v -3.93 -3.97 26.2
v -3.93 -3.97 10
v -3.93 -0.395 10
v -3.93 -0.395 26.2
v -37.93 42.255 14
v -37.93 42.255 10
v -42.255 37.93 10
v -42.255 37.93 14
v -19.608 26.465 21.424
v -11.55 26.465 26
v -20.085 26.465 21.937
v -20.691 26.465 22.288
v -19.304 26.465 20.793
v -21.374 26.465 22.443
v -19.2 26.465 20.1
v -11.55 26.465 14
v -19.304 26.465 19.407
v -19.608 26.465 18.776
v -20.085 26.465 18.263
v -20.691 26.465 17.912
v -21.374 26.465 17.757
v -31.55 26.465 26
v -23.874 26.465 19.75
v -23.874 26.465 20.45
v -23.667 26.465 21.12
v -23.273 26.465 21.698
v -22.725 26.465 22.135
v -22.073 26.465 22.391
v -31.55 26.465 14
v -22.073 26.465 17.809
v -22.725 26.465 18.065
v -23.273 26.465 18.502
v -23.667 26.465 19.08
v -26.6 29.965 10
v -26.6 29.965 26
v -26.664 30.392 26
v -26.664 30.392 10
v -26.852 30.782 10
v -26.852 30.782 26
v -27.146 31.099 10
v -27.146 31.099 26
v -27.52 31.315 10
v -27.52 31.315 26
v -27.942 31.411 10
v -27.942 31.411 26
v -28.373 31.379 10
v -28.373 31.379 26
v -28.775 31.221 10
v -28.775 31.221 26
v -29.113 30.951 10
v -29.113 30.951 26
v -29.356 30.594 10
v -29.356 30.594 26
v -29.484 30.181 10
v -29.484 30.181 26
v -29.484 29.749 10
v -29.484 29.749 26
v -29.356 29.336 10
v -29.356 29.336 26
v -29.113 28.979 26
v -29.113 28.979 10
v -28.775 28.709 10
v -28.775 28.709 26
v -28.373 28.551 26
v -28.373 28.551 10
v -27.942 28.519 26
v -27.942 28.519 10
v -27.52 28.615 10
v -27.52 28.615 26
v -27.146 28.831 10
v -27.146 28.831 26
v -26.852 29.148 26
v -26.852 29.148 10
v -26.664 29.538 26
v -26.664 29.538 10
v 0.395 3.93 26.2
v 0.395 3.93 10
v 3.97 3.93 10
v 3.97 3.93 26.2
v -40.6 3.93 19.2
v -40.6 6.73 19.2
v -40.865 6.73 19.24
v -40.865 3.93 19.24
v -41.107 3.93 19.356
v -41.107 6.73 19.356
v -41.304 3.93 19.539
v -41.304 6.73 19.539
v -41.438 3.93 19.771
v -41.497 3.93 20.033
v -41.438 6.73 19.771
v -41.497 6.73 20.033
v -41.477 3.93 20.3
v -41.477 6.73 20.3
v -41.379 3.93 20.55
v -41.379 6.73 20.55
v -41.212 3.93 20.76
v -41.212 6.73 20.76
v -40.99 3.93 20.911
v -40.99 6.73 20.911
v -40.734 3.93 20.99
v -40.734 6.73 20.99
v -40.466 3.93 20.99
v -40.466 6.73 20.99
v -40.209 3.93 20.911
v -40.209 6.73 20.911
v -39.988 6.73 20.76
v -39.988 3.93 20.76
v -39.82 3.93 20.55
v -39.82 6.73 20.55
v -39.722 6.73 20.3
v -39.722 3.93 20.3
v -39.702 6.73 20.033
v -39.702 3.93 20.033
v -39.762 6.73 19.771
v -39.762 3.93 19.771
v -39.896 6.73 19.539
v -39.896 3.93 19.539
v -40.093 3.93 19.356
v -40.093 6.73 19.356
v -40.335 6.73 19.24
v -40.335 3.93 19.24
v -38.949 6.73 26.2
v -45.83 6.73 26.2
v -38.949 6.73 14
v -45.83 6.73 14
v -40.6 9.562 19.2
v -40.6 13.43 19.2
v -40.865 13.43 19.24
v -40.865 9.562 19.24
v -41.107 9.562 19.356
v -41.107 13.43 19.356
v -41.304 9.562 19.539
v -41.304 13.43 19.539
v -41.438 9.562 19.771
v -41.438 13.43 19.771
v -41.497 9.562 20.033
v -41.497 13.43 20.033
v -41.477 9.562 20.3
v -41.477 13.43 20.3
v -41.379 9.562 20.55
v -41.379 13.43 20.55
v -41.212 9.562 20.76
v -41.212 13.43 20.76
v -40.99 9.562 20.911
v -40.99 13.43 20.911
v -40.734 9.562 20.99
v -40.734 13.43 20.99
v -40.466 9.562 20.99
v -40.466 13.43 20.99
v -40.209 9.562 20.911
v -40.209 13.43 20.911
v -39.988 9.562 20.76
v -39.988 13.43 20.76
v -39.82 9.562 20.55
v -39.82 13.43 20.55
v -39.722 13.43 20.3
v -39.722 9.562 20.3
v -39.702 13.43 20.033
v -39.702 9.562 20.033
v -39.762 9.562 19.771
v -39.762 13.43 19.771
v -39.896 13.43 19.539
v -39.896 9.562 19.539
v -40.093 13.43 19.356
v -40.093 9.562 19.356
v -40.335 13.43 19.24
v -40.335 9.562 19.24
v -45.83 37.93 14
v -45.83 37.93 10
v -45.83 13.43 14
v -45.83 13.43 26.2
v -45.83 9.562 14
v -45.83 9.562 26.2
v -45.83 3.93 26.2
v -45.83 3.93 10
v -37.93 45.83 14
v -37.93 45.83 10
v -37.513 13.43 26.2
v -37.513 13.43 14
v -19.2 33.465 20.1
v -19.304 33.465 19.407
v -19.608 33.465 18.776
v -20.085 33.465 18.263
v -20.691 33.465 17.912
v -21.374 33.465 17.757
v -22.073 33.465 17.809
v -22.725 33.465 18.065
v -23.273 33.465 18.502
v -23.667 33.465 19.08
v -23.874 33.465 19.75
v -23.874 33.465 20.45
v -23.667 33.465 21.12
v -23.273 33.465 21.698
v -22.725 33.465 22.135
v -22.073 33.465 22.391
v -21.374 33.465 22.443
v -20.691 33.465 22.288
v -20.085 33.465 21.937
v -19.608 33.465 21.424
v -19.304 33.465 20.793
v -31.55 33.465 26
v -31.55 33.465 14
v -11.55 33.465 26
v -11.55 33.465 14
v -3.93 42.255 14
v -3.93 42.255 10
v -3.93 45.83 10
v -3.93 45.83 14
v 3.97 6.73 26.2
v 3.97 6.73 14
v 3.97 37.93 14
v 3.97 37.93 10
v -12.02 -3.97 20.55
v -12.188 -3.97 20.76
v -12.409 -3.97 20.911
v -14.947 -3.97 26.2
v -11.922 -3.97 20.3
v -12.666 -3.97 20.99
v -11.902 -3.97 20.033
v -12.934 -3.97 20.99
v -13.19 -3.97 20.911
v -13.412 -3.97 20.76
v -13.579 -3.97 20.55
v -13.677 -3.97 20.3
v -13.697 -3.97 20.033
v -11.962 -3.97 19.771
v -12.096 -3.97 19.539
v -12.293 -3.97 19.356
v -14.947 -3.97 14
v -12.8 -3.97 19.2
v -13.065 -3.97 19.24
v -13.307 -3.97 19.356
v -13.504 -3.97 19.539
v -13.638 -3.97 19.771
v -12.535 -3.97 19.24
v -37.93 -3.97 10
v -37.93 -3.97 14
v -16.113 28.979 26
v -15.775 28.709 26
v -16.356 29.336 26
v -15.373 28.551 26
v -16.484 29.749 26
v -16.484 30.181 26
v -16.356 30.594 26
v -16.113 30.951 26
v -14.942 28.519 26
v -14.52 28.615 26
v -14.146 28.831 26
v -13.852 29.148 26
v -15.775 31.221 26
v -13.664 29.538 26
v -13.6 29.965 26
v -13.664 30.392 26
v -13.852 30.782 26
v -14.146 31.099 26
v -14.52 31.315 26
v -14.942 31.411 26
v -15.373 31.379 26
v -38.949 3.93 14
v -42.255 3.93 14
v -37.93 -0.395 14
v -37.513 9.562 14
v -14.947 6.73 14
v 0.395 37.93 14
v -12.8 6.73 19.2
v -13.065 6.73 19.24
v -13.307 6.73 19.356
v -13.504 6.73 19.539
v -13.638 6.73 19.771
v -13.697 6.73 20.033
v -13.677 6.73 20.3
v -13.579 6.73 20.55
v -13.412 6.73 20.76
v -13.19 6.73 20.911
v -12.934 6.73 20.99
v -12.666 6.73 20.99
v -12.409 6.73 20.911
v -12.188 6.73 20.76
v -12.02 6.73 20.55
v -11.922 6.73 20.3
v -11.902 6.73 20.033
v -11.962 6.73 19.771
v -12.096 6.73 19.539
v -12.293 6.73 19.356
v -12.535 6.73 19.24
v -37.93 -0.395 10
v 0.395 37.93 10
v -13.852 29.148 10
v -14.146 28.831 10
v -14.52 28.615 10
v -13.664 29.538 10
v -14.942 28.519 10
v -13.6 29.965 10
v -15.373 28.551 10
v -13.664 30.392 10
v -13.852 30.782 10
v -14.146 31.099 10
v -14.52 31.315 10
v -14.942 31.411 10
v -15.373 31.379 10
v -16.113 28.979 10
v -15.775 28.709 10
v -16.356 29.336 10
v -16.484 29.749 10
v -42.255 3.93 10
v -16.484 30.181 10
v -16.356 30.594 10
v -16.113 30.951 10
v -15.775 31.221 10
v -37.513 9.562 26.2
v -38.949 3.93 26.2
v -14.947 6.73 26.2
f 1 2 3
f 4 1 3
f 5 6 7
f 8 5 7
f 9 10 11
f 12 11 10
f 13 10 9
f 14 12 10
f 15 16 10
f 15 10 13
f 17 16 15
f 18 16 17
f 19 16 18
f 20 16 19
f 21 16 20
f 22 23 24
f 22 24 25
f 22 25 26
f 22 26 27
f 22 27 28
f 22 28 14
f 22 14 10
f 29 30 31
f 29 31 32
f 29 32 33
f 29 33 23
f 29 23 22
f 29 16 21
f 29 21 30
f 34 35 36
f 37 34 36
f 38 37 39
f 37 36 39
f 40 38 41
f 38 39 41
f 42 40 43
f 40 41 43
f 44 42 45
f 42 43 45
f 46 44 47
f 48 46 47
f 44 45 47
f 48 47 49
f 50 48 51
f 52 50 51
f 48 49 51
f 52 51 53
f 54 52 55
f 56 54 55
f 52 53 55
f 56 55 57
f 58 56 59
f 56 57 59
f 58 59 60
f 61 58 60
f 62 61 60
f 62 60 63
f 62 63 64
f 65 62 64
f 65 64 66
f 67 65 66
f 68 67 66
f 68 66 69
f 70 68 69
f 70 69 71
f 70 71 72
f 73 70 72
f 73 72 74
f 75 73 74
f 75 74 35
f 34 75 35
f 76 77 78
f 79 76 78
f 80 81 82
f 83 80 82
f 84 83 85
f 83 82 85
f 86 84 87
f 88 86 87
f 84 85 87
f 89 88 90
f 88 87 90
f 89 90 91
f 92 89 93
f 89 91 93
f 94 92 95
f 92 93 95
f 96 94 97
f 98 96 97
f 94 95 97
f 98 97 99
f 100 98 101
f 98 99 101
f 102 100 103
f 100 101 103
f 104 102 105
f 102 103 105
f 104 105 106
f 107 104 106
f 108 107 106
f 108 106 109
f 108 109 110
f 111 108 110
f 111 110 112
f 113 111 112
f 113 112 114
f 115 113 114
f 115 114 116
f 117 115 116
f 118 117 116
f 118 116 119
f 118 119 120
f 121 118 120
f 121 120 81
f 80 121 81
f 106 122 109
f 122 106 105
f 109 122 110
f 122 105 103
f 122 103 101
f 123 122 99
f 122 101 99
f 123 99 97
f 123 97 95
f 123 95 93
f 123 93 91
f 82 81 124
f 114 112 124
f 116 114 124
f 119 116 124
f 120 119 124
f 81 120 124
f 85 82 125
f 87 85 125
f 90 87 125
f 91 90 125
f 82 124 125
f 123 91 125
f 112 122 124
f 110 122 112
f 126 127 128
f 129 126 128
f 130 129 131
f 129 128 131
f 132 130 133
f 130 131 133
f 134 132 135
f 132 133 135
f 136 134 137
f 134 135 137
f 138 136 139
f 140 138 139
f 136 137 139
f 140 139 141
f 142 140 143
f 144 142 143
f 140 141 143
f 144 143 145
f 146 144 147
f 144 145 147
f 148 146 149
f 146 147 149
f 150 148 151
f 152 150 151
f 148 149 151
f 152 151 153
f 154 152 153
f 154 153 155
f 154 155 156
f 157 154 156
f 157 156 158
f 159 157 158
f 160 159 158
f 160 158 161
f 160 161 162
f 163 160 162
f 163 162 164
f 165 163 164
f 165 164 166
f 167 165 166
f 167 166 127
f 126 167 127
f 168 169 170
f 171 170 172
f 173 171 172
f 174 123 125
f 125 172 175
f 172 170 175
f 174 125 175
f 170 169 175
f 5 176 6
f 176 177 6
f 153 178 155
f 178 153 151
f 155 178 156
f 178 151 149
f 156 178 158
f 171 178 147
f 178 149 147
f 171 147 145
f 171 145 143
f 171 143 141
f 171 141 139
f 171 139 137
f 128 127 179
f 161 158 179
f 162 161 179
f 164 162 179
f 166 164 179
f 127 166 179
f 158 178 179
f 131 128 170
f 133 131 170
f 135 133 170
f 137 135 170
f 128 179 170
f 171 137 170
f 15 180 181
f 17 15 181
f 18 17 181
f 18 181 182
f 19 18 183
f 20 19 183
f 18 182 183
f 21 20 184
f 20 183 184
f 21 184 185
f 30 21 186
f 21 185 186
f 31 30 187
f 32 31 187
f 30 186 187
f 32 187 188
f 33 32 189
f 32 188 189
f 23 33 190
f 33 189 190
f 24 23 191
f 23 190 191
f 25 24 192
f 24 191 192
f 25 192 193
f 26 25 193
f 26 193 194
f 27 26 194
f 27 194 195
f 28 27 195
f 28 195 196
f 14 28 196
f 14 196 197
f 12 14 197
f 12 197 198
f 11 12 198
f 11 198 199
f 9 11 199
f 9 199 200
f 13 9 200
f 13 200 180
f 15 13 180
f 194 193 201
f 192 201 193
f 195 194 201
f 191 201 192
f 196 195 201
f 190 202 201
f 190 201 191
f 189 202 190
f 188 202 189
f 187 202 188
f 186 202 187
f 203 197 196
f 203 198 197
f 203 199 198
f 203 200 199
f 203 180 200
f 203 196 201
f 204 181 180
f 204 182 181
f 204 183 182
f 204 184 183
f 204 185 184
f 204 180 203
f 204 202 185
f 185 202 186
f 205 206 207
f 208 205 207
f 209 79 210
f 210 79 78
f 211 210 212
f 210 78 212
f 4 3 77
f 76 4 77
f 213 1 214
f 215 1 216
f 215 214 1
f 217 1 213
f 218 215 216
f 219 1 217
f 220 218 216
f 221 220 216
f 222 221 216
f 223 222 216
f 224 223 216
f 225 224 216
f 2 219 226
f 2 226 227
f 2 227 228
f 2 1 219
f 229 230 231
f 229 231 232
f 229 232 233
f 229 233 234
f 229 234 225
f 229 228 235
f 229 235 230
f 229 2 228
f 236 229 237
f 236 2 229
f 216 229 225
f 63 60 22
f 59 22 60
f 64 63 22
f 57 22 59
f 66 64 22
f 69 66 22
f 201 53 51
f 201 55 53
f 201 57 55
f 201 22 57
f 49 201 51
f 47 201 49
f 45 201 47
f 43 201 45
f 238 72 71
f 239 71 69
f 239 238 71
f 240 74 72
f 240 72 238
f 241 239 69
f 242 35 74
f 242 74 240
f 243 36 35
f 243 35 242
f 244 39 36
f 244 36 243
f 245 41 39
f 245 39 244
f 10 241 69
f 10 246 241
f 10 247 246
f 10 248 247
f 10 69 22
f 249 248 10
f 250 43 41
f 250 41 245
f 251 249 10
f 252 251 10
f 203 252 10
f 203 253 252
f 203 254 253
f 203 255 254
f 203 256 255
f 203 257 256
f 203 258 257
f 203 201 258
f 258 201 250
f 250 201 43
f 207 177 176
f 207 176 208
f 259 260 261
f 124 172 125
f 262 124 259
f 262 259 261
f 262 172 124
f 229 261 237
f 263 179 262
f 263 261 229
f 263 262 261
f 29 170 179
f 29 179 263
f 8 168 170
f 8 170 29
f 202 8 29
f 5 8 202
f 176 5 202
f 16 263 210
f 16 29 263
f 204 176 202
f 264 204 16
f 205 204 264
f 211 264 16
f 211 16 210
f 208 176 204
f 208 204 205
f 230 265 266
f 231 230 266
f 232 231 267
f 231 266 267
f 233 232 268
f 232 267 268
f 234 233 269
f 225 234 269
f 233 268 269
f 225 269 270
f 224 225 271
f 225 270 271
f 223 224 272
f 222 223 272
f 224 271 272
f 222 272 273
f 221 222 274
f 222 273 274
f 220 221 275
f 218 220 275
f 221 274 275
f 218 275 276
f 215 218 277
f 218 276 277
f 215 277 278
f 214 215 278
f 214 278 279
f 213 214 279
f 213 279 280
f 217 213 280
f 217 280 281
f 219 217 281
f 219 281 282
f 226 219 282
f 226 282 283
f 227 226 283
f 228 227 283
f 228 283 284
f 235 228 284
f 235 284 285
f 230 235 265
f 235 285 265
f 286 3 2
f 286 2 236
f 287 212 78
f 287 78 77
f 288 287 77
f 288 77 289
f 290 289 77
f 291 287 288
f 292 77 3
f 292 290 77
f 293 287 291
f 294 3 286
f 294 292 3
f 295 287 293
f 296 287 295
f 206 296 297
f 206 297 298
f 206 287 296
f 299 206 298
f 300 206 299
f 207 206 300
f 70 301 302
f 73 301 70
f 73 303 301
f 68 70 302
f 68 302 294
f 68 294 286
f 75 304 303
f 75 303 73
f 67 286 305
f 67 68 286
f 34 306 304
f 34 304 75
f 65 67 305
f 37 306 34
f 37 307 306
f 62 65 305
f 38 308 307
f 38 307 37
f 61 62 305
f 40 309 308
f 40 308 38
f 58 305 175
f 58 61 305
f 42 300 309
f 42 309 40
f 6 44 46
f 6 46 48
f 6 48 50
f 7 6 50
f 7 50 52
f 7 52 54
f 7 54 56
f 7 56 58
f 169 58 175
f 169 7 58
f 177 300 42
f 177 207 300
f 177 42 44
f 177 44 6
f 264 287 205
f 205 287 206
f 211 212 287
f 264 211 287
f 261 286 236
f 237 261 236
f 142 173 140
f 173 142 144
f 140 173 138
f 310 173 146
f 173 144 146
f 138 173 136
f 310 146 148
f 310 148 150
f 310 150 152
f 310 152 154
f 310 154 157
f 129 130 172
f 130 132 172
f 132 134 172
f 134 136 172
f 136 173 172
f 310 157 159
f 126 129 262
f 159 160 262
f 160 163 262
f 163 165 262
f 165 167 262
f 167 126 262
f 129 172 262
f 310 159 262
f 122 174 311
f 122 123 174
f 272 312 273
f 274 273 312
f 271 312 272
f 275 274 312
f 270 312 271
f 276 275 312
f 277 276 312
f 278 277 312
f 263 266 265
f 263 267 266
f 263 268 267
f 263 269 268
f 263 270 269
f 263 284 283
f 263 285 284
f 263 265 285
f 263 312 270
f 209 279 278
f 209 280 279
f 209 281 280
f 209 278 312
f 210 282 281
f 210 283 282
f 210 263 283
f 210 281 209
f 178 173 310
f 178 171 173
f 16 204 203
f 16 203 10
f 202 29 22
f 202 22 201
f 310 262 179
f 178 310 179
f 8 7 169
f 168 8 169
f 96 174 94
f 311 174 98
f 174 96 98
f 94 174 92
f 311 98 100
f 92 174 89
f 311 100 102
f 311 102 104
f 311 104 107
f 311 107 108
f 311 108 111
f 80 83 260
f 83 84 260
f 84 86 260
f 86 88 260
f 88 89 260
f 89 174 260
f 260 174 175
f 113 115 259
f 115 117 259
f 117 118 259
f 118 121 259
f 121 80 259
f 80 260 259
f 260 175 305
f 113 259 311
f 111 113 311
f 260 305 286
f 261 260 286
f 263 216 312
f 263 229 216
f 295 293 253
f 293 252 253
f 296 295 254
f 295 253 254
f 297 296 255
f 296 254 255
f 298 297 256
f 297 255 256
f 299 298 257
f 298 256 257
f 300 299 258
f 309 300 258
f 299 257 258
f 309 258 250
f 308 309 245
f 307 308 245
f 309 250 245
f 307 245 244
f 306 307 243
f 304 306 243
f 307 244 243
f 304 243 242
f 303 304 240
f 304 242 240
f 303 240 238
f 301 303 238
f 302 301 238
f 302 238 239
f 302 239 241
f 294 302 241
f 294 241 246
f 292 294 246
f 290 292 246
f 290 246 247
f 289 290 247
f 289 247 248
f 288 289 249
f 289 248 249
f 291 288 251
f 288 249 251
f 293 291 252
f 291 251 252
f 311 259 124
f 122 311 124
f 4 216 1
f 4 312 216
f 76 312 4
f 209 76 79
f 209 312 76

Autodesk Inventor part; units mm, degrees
ref_plane "YZ Plane" through (0, 0, 0) normal (1, 0, 0) x (0, 1, 0)
ref_plane "Work Plane1" through (0, 0, 10) normal (0, 0, 1) x (1, 0, 0)
sketch "Sketch1" plane through (0, 0, 10) normal (0, 0, 1) x (1, 0, 0)
  line L0 (-4.0299, -0.3538) -> (-2.2322, 1.4439) construction
  arc A0 (-1.4439, 2.2322) -> (-2.2322, 1.4439) centre (-0.9299, 0.9299) ccw construction
  line L1 (-1.4439, 2.2322) -> (0.3538, 4.0299) construction
  line L2 (-37.8299, 42.2137) -> (-37.8299, 45.8299) construction
  line L3 (-37.8299, 45.8299) -> (-4.0299, 45.8299) construction
  line L4 (-4.0299, 45.8299) -> (-4.0299, 42.2137) construction
  line L5 (-4.0299, 4.0299) -> (0.3538, 4.0299) projected
  circle A1 centre (-20.9299, 20.9299) radius 17.5 construction
  line L6 (-20.9299, 58.9723) -> (17.1124, 20.9299) construction
  line L7 (17.1124, 20.9299) -> (-20.9299, -17.1124) construction
  line L8 (-20.9299, -17.1124) -> (-58.9723, 20.9299) construction
  line L9 (-58.9723, 20.9299) -> (-20.9299, 58.9723) construction
  line L10 (-20.9299, 58.9723) -> (-20.9299, -17.1124) construction
  line L11 (17.1124, 20.9299) -> (-58.9723, 20.9299) construction
  line L12 (-20.9299, 58.9723) -> (32.8701, 58.9723) construction
  line L13 (-43.2198, 43.4299) -> (1.7802, 43.4299) construction
  line L14 (1.7802, 43.4299) -> (1.7802, -1.5701) construction
  line L15 (1.7802, -1.5701) -> (-43.2198, -1.5701) construction
  line L16 (-43.2198, -1.5701) -> (-43.2198, 43.4299) construction
  line L17 (-43.2198, 5.1774) -> (-43.2198, 36.6824)
  line L18 (-43.2198, 36.6824) -> (-36.4723, 43.4299)
  line L19 (-36.4723, 43.4299) -> (-5.3876, 43.4299)
  line L20 (-5.3876, 43.4299) -> (1.7802, 36.2621)
  line L21 (1.7802, 36.2621) -> (1.7802, 5.5977)
  line L22 (1.7802, 5.5977) -> (-5.3876, -1.5701)
  line L23 (-5.3876, -1.5701) -> (-36.4723, -1.5701)
  line L24 (-36.4723, -1.5701) -> (-43.2198, 5.1774)
  line L25 (-4.0299, 42.2137) -> (-37.8299, 42.2137) projected
  line L26 (-4.0299, -0.3538) -> (-4.0299, 4.0299) projected
  circle A2 centre (-20.7198, 20.9299) radius 7.0417 construction
  arc A3 (-7.3745, 3.5) -> (-34.4854, 3.5) centre (-20.9299, 0) ccw construction
  arc A4 (-11.4668, 9.7661) -> (-30.4087, 10.1422) centre (-20.7198, 20.9299) ccw
  line L27 (-30.5806, 10.1422) -> (-30.4087, 10.1422)
  line L28 (-30.4087, 10.1422) -> (-30.4087, 1.6029)
  line L29 (-30.4087, 1.6029) -> (-11.4668, 1.6029)
  line L30 (-11.4668, 1.6029) -> (-11.4668, 9.7661)
  line L31 (-43.2198, 43.4299) -> (-10.4667, 10.6769) construction
  line L32 (-8.5595, 8.5517) -> (1.7802, -1.5701) construction
  line L33 (1.7802, 43.4299) -> (-25.699, 15.9507) construction
  line L34 (-30.9728, 10.6769) -> (-43.2198, -1.5701) construction
  point P0 (-37.8299, 4.0299)
  dimension "d18" = 53.8
  dimension "d19" = 45
  dimension "d20" = 53.8
  dimension "d21" = 45
  dimension "d22" = 45
  dimension "d68" = 29
extrude "Extrusion1" add sketch "Sketch1" along normal blind 4 contours L26 L22 L23 L24 L17 L18 L25 L20 L21 L5 | L5 L22 L26 | L25 L18 L19 L20 | L30 L29 L28 A4
sketch "Sketch3" plane through (0, 0, 10) normal (0, 0, -1) x (-1, 0, 0)
  line L0 (37.8299, -0.4701) -> (37.8299, 4.0299) construction
  line L1 (4.0299, 4.0299) -> (4.0299, -0.4701) construction
  line L2 (37.8299, -0.4701) -> (37.8299, 1.1886) construction
  line L3 (4.0299, -3.9701) -> (4.0299, -0.3538) construction
  line L4 (45.8299, 4.0299) -> (42.2137, 4.0299) construction
  line L5 (-0.3538, 4.0299) -> (-3.9701, 4.0299) construction
  line L6 (-3.9701, 37.8299) -> (-0.3538, 37.8299) construction
  line L7 (4.0299, 42.2137) -> (4.0299, 45.8299) construction
  line L8 (37.8299, 45.8299) -> (37.8299, 42.2137) construction
  line L9 (42.2137, 37.8299) -> (45.8299, 37.8299) construction
  line L10 (37.8299, 37.7299) -> (45.8299, 37.7299)
  line L11 (45.8299, 37.7299) -> (45.8299, 4.1299)
  line L12 (45.8299, 4.1299) -> (37.8299, 4.1299)
  line L13 (37.8299, 4.1299) -> (37.8299, 37.7299)
  line L14 (37.7299, 4.0299) -> (4.1299, 4.0299)
  line L15 (4.1299, 4.0299) -> (4.1299, -3.9701)
  line L16 (4.1299, -3.9701) -> (37.7299, -3.9701)
  line L17 (37.7299, -3.9701) -> (37.7299, 4.0299)
  line L18 (4.0299, 4.1299) -> (-3.9701, 4.1299)
  line L19 (-3.9701, 4.1299) -> (-3.9701, 37.7299)
  line L20 (-3.9701, 37.7299) -> (4.0299, 37.7299)
  line L21 (4.0299, 37.7299) -> (4.0299, 4.1299)
  line L22 (4.1299, 37.8299) -> (37.7299, 37.8299)
  line L23 (37.7299, 37.8299) -> (37.7299, 45.8299)
  line L24 (37.7299, 45.8299) -> (4.1299, 45.8299)
  line L25 (4.1299, 45.8299) -> (4.1299, 37.8299)
  point P0 (0, 0)
  dimension "d23" = 0.1
  dimension "d24" = 0.1
  dimension "d25" = 0.1
  dimension "d26" = 0.1
  dimension "d27" = 0.1
extrude "Extrusion3" add sketch "Sketch3" against normal up to surface (4 mm away)
sketch "Skizze12" plane through (0, 0, 10) normal (0, 0, -1) x (-1, 0, 0)
  line L0 (-0.3124, 4.1299) -> (4.1299, -0.3124) projected
  line L1 (4.1299, -0.3124) -> (4.1299, -3.9701) projected
  line L2 (4.1299, -3.9701) -> (37.7299, -3.9701) construction
  line L3 (37.7299, -3.9701) -> (37.7299, -0.3124) projected
  line L4 (37.7299, -0.3124) -> (42.1723, 4.1299) projected
  line L5 (45.8299, 4.1299) -> (42.1723, 4.1299) projected
  line L6 (45.8299, 37.7299) -> (45.8299, 4.1299) construction
  line L7 (42.1723, 37.7299) -> (45.8299, 37.7299) projected
  line L8 (42.1723, 37.7299) -> (37.7299, 42.1723) projected
  line L9 (37.7299, 42.1723) -> (37.7299, 45.8299) projected
  line L10 (37.7299, 45.8299) -> (4.1299, 45.8299) construction
  line L11 (4.1299, 45.8299) -> (4.1299, 42.1723) projected
  line L12 (4.1299, 42.1723) -> (-0.3124, 37.7299) projected
  line L13 (-3.9701, 37.7299) -> (-0.3124, 37.7299) projected
  line L14 (-3.9701, 4.1299) -> (-3.9701, 37.7299) construction
  line L15 (-0.3124, 4.1299) -> (-3.9701, 4.1299) projected
  line L16 (37.9299, -4.1701) -> (3.9299, -4.1701) construction
  line L17 (3.9299, -4.1701) -> (3.9299, -0.3953)
  line L18 (3.9299, -0.3953) -> (-0.3953, 3.9299)
  line L19 (-0.3953, 3.9299) -> (-4.1701, 3.9299)
  line L20 (-4.1701, 3.9299) -> (-4.1701, 37.9299) construction
  line L21 (-4.1701, 37.9299) -> (-0.3953, 37.9299)
  line L22 (-0.3953, 37.9299) -> (3.9299, 42.2551)
  line L23 (3.9299, 42.2551) -> (3.9299, 46.0299)
  line L24 (3.9299, 46.0299) -> (37.9299, 46.0299) construction
  line L25 (37.9299, 46.0299) -> (37.9299, 42.2551)
  line L26 (37.9299, 42.2551) -> (42.2551, 37.9299)
  line L27 (42.2551, 37.9299) -> (46.0299, 37.9299)
  line L28 (46.0299, 37.9299) -> (46.0299, 3.9299) construction
  line L29 (46.0299, 3.9299) -> (42.2551, 3.9299)
  line L30 (42.2551, 3.9299) -> (37.9299, -0.3953)
  line L31 (37.9299, -0.3953) -> (37.9299, -4.1701)
  line L32 (-3.9701, 37.7299) -> (-3.9701, 37.9299)
  line L33 (37.7299, 45.8299) -> (4.1299, 45.8299) projected
  line L34 (4.1299, 45.8299) -> (3.9299, 45.8299)
  line L35 (37.7299, 45.8299) -> (37.9299, 45.8299)
  line L36 (45.8299, 37.7299) -> (45.8299, 37.9299)
  line L37 (45.8299, 4.1299) -> (45.8299, 3.9299)
  line L38 (37.7299, -3.9701) -> (37.9299, -3.9701)
  line L39 (4.1299, -3.9701) -> (3.9299, -3.9701)
  line L40 (-3.9701, 4.1299) -> (-3.9701, 3.9299)
  point P0 (0, 0)
  dimension "d65" = 0.2
extrude "IM_offset" add sketch "Skizze12" against normal up to surface (4 mm away)
sketch "Sketch15" plane through (0, 0, 14) normal (0, 0, 1) x (1, 0, 0)
  line L0 (-16.2999, 13.4299) -> (-16.2999, 9.2299) projected
  line L1 (-16.2999, 13.4299) -> (-19.9879, 13.4299) projected
  line L2 (-21.5499, 13.4299) -> (-19.9879, 13.4299) projected
  line L3 (-23.112, 13.4299) -> (-21.5499, 13.4299) projected
  line L4 (-23.112, 13.4299) -> (-37.0999, 13.4299) projected
  line L5 (-37.0999, 13.4299) -> (-37.0999, 9.2299) projected
  line L6 (-41.8999, 9.2299) -> (-37.0999, 9.2299) projected
  line L7 (-41.8999, 9.2299) -> (-41.8999, 6.7299) projected
  line L8 (-41.8999, 6.7299) -> (-11.4999, 6.7299) projected
  line L9 (-11.4999, 9.2299) -> (-11.4999, 6.7299) projected
  line L10 (-16.2999, 9.2299) -> (-11.4999, 9.2299) projected
  line L11 (3.9701, 37.9299) -> (3.9701, 3.9299) projected
  line L12 (0.3953, 37.9299) -> (3.9701, 37.9299) projected
  line L13 (-3.9299, 42.2551) -> (0.3953, 37.9299) projected
  line L14 (-3.9299, 45.8299) -> (-3.9299, 42.2551) projected
  line L15 (-37.9299, 45.8299) -> (-3.9299, 45.8299) projected
  line L16 (-37.9299, 42.2551) -> (-37.9299, 45.8299) projected
  line L17 (-42.2551, 37.9299) -> (-37.9299, 42.2551) projected
  line L18 (-45.8299, 37.9299) -> (-42.2551, 37.9299) projected
  line L19 (-45.8299, 3.9299) -> (-45.8299, 37.9299) projected
  line L20 (-42.2551, 3.9299) -> (-45.8299, 3.9299) projected
  line L21 (-37.9299, -0.3953) -> (-42.2551, 3.9299) projected
  line L22 (-37.9299, -3.9701) -> (-37.9299, -0.3953) projected
  line L23 (-3.9299, -3.9701) -> (-37.9299, -3.9701) projected
  line L24 (-3.9299, -0.3953) -> (-3.9299, -3.9701) projected
  line L25 (0.3953, 3.9299) -> (-3.9299, -0.3953) projected
  line L26 (3.9701, 3.9299) -> (0.3953, 3.9299) projected
  line L27 (-45.8299, 3.9299) -> (-38.9491, 3.9299)
  line L28 (-38.9491, 3.9299) -> (-38.9491, 6.7299)
  line L29 (-38.9491, 6.7299) -> (-45.8299, 6.7299)
  line L30 (-45.8299, 6.7299) -> (-45.8299, 3.9299)
  line L31 (3.9701, 3.9299) -> (0.3953, 3.9299) projected
  line L32 (-14.947, 6.7299) -> (3.9701, 6.7299)
  line L33 (3.9701, 6.7299) -> (3.9701, 3.9299)
  line L34 (3.9701, 3.9299) -> (-14.947, 3.9299)
  line L35 (-14.947, 3.9299) -> (-14.947, 6.7299)
  line L36 (0.3953, 3.9299) -> (-3.9299, -0.3953)
  line L37 (-3.9299, -0.3953) -> (-3.9299, -3.9701)
  line L38 (-3.9299, -3.9701) -> (-37.9299, -3.9701) projected
  line L39 (-3.9299, -3.9701) -> (-14.947, -3.9701)
  line L40 (-14.947, 3.9299) -> (-14.947, -3.9701)
  line L41 (-45.8299, 3.9299) -> (-45.8299, 37.9299) projected
  line L42 (-45.8299, 9.5618) -> (-37.5128, 9.5618)
  line L43 (-37.5128, 9.5618) -> (-37.5128, 13.4299)
  line L44 (-37.5128, 13.4299) -> (-45.8299, 13.4299)
  line L45 (-45.8299, 13.4299) -> (-45.8299, 9.5618)
  point P0 (0, 0)
ref_plane "Work Plane4" through (-41.8999, 11.7299, 26.2) normal (0, 0, 1) x (1, 0, 0)
extrude "Extrusion13" add sketch "Sketch15" along normal up to surface (12.2 mm away) contours L32 L11 L26 L34 L35 L8 | L28 L27 L20 L19 L29 L8 | L34 L25 L24 L23 L40 | L19 L44 L43 L42
sketch "Sketch16" plane through (-45.8299, -3.9701, 10) normal (0, -1, 0) x (1, 0, 0)
  circle A0 centre (5.23, 10.1) radius 0.8388 projected
  circle A1 centre (5.23, 10.1) radius 1.5765 projected
  circle A2 centre (33.03, 10.1) radius 2.4 projected
  point P0 (45.8299, -10)
hole "Hole1" at (-40.5999, -3.9701, 20.1) at (-12.7999, -3.9701, 20.1) direction (0, 1, 0) diameter 1.8 end through all
sketch "Sketch17" plane through (0, 0, 14) normal (0, 0, 1) x (1, 0, 0)
  line L0 (-18.1603, 25.8799) -> (-22.3637, 25.8799) projected
  line L1 (-22.3637, 25.8799) -> (-47.0707, 25.8799) projected
  line L2 (-19.1999, 18.8799) -> (-19.1999, 25.8799)
  line L3 (-23.8999, 18.8799) -> (-23.8999, 25.8799)
  line L4 (-11.5499, 26.4651) -> (-31.5499, 26.4651)
  line L5 (-31.5499, 26.4651) -> (-31.5499, 33.4651)
  line L6 (-31.5499, 33.4651) -> (-11.5499, 33.4651)
  line L7 (-11.5499, 33.4651) -> (-11.5499, 26.4651)
  point P0 (0, 0)
  dimension "d82" = 20
  dimension "d83" = 7
  dimension "d84" = 7.65
extrude "Extrusion14" add sketch "Sketch17" along normal blind 12
sketch "Sketch18" plane through (-31.5499, 33.4651, 14) normal (0, 1, 0) x (1, 0, 0)
  circle A0 centre (10, -6.1) radius 2.35 projected
  point P0 (31.5499, 14)
extrude "Extrusion15" cut sketch "Sketch18" against normal blind 12
sketch "Sketch19" plane through (0, 0, 26) normal (0, 0, 1) x (1, 0, 0)
  line L0 (-31.5499, 26.4651) -> (-11.5499, 26.4651) projected
  line L1 (-11.5499, 26.4651) -> (-11.5499, 33.4651) projected
  line L2 (-11.5499, 33.4651) -> (-31.5499, 33.4651) projected
  line L3 (-31.5499, 33.4651) -> (-31.5499, 26.4651) projected
  circle A0 centre (-15.0499, 29.9651) radius 1.45
  circle A1 centre (-28.0499, 29.9651) radius 1.45
  point P0 (0, 0)
  dimension "d89" = 2.9
  dimension "d90" = 3.5
  dimension "d91" = 3.5
  dimension "d92" = 2.9
  dimension "d93" = 3.5
extrude "Extrusion16" cut sketch "Sketch19" against normal through all contours A0 | A1
sketch "Sketch20" plane through (0, 0, 26) normal (0, 0, 1) x (1, 0, 0)
  line L0 (-9.7781, 37.8674) -> (-41.4214, 37.8674)
  line L1 (-41.4214, 37.8674) -> (-41.4214, 22.8936)
  line L2 (-41.4214, 22.8936) -> (-9.7781, 22.8936)
  line L3 (-9.7781, 22.8936) -> (-9.7781, 37.8674)
  point P0 (0, 0)
properties part number "20_Cube_Insert_RaspiCam_v3"
